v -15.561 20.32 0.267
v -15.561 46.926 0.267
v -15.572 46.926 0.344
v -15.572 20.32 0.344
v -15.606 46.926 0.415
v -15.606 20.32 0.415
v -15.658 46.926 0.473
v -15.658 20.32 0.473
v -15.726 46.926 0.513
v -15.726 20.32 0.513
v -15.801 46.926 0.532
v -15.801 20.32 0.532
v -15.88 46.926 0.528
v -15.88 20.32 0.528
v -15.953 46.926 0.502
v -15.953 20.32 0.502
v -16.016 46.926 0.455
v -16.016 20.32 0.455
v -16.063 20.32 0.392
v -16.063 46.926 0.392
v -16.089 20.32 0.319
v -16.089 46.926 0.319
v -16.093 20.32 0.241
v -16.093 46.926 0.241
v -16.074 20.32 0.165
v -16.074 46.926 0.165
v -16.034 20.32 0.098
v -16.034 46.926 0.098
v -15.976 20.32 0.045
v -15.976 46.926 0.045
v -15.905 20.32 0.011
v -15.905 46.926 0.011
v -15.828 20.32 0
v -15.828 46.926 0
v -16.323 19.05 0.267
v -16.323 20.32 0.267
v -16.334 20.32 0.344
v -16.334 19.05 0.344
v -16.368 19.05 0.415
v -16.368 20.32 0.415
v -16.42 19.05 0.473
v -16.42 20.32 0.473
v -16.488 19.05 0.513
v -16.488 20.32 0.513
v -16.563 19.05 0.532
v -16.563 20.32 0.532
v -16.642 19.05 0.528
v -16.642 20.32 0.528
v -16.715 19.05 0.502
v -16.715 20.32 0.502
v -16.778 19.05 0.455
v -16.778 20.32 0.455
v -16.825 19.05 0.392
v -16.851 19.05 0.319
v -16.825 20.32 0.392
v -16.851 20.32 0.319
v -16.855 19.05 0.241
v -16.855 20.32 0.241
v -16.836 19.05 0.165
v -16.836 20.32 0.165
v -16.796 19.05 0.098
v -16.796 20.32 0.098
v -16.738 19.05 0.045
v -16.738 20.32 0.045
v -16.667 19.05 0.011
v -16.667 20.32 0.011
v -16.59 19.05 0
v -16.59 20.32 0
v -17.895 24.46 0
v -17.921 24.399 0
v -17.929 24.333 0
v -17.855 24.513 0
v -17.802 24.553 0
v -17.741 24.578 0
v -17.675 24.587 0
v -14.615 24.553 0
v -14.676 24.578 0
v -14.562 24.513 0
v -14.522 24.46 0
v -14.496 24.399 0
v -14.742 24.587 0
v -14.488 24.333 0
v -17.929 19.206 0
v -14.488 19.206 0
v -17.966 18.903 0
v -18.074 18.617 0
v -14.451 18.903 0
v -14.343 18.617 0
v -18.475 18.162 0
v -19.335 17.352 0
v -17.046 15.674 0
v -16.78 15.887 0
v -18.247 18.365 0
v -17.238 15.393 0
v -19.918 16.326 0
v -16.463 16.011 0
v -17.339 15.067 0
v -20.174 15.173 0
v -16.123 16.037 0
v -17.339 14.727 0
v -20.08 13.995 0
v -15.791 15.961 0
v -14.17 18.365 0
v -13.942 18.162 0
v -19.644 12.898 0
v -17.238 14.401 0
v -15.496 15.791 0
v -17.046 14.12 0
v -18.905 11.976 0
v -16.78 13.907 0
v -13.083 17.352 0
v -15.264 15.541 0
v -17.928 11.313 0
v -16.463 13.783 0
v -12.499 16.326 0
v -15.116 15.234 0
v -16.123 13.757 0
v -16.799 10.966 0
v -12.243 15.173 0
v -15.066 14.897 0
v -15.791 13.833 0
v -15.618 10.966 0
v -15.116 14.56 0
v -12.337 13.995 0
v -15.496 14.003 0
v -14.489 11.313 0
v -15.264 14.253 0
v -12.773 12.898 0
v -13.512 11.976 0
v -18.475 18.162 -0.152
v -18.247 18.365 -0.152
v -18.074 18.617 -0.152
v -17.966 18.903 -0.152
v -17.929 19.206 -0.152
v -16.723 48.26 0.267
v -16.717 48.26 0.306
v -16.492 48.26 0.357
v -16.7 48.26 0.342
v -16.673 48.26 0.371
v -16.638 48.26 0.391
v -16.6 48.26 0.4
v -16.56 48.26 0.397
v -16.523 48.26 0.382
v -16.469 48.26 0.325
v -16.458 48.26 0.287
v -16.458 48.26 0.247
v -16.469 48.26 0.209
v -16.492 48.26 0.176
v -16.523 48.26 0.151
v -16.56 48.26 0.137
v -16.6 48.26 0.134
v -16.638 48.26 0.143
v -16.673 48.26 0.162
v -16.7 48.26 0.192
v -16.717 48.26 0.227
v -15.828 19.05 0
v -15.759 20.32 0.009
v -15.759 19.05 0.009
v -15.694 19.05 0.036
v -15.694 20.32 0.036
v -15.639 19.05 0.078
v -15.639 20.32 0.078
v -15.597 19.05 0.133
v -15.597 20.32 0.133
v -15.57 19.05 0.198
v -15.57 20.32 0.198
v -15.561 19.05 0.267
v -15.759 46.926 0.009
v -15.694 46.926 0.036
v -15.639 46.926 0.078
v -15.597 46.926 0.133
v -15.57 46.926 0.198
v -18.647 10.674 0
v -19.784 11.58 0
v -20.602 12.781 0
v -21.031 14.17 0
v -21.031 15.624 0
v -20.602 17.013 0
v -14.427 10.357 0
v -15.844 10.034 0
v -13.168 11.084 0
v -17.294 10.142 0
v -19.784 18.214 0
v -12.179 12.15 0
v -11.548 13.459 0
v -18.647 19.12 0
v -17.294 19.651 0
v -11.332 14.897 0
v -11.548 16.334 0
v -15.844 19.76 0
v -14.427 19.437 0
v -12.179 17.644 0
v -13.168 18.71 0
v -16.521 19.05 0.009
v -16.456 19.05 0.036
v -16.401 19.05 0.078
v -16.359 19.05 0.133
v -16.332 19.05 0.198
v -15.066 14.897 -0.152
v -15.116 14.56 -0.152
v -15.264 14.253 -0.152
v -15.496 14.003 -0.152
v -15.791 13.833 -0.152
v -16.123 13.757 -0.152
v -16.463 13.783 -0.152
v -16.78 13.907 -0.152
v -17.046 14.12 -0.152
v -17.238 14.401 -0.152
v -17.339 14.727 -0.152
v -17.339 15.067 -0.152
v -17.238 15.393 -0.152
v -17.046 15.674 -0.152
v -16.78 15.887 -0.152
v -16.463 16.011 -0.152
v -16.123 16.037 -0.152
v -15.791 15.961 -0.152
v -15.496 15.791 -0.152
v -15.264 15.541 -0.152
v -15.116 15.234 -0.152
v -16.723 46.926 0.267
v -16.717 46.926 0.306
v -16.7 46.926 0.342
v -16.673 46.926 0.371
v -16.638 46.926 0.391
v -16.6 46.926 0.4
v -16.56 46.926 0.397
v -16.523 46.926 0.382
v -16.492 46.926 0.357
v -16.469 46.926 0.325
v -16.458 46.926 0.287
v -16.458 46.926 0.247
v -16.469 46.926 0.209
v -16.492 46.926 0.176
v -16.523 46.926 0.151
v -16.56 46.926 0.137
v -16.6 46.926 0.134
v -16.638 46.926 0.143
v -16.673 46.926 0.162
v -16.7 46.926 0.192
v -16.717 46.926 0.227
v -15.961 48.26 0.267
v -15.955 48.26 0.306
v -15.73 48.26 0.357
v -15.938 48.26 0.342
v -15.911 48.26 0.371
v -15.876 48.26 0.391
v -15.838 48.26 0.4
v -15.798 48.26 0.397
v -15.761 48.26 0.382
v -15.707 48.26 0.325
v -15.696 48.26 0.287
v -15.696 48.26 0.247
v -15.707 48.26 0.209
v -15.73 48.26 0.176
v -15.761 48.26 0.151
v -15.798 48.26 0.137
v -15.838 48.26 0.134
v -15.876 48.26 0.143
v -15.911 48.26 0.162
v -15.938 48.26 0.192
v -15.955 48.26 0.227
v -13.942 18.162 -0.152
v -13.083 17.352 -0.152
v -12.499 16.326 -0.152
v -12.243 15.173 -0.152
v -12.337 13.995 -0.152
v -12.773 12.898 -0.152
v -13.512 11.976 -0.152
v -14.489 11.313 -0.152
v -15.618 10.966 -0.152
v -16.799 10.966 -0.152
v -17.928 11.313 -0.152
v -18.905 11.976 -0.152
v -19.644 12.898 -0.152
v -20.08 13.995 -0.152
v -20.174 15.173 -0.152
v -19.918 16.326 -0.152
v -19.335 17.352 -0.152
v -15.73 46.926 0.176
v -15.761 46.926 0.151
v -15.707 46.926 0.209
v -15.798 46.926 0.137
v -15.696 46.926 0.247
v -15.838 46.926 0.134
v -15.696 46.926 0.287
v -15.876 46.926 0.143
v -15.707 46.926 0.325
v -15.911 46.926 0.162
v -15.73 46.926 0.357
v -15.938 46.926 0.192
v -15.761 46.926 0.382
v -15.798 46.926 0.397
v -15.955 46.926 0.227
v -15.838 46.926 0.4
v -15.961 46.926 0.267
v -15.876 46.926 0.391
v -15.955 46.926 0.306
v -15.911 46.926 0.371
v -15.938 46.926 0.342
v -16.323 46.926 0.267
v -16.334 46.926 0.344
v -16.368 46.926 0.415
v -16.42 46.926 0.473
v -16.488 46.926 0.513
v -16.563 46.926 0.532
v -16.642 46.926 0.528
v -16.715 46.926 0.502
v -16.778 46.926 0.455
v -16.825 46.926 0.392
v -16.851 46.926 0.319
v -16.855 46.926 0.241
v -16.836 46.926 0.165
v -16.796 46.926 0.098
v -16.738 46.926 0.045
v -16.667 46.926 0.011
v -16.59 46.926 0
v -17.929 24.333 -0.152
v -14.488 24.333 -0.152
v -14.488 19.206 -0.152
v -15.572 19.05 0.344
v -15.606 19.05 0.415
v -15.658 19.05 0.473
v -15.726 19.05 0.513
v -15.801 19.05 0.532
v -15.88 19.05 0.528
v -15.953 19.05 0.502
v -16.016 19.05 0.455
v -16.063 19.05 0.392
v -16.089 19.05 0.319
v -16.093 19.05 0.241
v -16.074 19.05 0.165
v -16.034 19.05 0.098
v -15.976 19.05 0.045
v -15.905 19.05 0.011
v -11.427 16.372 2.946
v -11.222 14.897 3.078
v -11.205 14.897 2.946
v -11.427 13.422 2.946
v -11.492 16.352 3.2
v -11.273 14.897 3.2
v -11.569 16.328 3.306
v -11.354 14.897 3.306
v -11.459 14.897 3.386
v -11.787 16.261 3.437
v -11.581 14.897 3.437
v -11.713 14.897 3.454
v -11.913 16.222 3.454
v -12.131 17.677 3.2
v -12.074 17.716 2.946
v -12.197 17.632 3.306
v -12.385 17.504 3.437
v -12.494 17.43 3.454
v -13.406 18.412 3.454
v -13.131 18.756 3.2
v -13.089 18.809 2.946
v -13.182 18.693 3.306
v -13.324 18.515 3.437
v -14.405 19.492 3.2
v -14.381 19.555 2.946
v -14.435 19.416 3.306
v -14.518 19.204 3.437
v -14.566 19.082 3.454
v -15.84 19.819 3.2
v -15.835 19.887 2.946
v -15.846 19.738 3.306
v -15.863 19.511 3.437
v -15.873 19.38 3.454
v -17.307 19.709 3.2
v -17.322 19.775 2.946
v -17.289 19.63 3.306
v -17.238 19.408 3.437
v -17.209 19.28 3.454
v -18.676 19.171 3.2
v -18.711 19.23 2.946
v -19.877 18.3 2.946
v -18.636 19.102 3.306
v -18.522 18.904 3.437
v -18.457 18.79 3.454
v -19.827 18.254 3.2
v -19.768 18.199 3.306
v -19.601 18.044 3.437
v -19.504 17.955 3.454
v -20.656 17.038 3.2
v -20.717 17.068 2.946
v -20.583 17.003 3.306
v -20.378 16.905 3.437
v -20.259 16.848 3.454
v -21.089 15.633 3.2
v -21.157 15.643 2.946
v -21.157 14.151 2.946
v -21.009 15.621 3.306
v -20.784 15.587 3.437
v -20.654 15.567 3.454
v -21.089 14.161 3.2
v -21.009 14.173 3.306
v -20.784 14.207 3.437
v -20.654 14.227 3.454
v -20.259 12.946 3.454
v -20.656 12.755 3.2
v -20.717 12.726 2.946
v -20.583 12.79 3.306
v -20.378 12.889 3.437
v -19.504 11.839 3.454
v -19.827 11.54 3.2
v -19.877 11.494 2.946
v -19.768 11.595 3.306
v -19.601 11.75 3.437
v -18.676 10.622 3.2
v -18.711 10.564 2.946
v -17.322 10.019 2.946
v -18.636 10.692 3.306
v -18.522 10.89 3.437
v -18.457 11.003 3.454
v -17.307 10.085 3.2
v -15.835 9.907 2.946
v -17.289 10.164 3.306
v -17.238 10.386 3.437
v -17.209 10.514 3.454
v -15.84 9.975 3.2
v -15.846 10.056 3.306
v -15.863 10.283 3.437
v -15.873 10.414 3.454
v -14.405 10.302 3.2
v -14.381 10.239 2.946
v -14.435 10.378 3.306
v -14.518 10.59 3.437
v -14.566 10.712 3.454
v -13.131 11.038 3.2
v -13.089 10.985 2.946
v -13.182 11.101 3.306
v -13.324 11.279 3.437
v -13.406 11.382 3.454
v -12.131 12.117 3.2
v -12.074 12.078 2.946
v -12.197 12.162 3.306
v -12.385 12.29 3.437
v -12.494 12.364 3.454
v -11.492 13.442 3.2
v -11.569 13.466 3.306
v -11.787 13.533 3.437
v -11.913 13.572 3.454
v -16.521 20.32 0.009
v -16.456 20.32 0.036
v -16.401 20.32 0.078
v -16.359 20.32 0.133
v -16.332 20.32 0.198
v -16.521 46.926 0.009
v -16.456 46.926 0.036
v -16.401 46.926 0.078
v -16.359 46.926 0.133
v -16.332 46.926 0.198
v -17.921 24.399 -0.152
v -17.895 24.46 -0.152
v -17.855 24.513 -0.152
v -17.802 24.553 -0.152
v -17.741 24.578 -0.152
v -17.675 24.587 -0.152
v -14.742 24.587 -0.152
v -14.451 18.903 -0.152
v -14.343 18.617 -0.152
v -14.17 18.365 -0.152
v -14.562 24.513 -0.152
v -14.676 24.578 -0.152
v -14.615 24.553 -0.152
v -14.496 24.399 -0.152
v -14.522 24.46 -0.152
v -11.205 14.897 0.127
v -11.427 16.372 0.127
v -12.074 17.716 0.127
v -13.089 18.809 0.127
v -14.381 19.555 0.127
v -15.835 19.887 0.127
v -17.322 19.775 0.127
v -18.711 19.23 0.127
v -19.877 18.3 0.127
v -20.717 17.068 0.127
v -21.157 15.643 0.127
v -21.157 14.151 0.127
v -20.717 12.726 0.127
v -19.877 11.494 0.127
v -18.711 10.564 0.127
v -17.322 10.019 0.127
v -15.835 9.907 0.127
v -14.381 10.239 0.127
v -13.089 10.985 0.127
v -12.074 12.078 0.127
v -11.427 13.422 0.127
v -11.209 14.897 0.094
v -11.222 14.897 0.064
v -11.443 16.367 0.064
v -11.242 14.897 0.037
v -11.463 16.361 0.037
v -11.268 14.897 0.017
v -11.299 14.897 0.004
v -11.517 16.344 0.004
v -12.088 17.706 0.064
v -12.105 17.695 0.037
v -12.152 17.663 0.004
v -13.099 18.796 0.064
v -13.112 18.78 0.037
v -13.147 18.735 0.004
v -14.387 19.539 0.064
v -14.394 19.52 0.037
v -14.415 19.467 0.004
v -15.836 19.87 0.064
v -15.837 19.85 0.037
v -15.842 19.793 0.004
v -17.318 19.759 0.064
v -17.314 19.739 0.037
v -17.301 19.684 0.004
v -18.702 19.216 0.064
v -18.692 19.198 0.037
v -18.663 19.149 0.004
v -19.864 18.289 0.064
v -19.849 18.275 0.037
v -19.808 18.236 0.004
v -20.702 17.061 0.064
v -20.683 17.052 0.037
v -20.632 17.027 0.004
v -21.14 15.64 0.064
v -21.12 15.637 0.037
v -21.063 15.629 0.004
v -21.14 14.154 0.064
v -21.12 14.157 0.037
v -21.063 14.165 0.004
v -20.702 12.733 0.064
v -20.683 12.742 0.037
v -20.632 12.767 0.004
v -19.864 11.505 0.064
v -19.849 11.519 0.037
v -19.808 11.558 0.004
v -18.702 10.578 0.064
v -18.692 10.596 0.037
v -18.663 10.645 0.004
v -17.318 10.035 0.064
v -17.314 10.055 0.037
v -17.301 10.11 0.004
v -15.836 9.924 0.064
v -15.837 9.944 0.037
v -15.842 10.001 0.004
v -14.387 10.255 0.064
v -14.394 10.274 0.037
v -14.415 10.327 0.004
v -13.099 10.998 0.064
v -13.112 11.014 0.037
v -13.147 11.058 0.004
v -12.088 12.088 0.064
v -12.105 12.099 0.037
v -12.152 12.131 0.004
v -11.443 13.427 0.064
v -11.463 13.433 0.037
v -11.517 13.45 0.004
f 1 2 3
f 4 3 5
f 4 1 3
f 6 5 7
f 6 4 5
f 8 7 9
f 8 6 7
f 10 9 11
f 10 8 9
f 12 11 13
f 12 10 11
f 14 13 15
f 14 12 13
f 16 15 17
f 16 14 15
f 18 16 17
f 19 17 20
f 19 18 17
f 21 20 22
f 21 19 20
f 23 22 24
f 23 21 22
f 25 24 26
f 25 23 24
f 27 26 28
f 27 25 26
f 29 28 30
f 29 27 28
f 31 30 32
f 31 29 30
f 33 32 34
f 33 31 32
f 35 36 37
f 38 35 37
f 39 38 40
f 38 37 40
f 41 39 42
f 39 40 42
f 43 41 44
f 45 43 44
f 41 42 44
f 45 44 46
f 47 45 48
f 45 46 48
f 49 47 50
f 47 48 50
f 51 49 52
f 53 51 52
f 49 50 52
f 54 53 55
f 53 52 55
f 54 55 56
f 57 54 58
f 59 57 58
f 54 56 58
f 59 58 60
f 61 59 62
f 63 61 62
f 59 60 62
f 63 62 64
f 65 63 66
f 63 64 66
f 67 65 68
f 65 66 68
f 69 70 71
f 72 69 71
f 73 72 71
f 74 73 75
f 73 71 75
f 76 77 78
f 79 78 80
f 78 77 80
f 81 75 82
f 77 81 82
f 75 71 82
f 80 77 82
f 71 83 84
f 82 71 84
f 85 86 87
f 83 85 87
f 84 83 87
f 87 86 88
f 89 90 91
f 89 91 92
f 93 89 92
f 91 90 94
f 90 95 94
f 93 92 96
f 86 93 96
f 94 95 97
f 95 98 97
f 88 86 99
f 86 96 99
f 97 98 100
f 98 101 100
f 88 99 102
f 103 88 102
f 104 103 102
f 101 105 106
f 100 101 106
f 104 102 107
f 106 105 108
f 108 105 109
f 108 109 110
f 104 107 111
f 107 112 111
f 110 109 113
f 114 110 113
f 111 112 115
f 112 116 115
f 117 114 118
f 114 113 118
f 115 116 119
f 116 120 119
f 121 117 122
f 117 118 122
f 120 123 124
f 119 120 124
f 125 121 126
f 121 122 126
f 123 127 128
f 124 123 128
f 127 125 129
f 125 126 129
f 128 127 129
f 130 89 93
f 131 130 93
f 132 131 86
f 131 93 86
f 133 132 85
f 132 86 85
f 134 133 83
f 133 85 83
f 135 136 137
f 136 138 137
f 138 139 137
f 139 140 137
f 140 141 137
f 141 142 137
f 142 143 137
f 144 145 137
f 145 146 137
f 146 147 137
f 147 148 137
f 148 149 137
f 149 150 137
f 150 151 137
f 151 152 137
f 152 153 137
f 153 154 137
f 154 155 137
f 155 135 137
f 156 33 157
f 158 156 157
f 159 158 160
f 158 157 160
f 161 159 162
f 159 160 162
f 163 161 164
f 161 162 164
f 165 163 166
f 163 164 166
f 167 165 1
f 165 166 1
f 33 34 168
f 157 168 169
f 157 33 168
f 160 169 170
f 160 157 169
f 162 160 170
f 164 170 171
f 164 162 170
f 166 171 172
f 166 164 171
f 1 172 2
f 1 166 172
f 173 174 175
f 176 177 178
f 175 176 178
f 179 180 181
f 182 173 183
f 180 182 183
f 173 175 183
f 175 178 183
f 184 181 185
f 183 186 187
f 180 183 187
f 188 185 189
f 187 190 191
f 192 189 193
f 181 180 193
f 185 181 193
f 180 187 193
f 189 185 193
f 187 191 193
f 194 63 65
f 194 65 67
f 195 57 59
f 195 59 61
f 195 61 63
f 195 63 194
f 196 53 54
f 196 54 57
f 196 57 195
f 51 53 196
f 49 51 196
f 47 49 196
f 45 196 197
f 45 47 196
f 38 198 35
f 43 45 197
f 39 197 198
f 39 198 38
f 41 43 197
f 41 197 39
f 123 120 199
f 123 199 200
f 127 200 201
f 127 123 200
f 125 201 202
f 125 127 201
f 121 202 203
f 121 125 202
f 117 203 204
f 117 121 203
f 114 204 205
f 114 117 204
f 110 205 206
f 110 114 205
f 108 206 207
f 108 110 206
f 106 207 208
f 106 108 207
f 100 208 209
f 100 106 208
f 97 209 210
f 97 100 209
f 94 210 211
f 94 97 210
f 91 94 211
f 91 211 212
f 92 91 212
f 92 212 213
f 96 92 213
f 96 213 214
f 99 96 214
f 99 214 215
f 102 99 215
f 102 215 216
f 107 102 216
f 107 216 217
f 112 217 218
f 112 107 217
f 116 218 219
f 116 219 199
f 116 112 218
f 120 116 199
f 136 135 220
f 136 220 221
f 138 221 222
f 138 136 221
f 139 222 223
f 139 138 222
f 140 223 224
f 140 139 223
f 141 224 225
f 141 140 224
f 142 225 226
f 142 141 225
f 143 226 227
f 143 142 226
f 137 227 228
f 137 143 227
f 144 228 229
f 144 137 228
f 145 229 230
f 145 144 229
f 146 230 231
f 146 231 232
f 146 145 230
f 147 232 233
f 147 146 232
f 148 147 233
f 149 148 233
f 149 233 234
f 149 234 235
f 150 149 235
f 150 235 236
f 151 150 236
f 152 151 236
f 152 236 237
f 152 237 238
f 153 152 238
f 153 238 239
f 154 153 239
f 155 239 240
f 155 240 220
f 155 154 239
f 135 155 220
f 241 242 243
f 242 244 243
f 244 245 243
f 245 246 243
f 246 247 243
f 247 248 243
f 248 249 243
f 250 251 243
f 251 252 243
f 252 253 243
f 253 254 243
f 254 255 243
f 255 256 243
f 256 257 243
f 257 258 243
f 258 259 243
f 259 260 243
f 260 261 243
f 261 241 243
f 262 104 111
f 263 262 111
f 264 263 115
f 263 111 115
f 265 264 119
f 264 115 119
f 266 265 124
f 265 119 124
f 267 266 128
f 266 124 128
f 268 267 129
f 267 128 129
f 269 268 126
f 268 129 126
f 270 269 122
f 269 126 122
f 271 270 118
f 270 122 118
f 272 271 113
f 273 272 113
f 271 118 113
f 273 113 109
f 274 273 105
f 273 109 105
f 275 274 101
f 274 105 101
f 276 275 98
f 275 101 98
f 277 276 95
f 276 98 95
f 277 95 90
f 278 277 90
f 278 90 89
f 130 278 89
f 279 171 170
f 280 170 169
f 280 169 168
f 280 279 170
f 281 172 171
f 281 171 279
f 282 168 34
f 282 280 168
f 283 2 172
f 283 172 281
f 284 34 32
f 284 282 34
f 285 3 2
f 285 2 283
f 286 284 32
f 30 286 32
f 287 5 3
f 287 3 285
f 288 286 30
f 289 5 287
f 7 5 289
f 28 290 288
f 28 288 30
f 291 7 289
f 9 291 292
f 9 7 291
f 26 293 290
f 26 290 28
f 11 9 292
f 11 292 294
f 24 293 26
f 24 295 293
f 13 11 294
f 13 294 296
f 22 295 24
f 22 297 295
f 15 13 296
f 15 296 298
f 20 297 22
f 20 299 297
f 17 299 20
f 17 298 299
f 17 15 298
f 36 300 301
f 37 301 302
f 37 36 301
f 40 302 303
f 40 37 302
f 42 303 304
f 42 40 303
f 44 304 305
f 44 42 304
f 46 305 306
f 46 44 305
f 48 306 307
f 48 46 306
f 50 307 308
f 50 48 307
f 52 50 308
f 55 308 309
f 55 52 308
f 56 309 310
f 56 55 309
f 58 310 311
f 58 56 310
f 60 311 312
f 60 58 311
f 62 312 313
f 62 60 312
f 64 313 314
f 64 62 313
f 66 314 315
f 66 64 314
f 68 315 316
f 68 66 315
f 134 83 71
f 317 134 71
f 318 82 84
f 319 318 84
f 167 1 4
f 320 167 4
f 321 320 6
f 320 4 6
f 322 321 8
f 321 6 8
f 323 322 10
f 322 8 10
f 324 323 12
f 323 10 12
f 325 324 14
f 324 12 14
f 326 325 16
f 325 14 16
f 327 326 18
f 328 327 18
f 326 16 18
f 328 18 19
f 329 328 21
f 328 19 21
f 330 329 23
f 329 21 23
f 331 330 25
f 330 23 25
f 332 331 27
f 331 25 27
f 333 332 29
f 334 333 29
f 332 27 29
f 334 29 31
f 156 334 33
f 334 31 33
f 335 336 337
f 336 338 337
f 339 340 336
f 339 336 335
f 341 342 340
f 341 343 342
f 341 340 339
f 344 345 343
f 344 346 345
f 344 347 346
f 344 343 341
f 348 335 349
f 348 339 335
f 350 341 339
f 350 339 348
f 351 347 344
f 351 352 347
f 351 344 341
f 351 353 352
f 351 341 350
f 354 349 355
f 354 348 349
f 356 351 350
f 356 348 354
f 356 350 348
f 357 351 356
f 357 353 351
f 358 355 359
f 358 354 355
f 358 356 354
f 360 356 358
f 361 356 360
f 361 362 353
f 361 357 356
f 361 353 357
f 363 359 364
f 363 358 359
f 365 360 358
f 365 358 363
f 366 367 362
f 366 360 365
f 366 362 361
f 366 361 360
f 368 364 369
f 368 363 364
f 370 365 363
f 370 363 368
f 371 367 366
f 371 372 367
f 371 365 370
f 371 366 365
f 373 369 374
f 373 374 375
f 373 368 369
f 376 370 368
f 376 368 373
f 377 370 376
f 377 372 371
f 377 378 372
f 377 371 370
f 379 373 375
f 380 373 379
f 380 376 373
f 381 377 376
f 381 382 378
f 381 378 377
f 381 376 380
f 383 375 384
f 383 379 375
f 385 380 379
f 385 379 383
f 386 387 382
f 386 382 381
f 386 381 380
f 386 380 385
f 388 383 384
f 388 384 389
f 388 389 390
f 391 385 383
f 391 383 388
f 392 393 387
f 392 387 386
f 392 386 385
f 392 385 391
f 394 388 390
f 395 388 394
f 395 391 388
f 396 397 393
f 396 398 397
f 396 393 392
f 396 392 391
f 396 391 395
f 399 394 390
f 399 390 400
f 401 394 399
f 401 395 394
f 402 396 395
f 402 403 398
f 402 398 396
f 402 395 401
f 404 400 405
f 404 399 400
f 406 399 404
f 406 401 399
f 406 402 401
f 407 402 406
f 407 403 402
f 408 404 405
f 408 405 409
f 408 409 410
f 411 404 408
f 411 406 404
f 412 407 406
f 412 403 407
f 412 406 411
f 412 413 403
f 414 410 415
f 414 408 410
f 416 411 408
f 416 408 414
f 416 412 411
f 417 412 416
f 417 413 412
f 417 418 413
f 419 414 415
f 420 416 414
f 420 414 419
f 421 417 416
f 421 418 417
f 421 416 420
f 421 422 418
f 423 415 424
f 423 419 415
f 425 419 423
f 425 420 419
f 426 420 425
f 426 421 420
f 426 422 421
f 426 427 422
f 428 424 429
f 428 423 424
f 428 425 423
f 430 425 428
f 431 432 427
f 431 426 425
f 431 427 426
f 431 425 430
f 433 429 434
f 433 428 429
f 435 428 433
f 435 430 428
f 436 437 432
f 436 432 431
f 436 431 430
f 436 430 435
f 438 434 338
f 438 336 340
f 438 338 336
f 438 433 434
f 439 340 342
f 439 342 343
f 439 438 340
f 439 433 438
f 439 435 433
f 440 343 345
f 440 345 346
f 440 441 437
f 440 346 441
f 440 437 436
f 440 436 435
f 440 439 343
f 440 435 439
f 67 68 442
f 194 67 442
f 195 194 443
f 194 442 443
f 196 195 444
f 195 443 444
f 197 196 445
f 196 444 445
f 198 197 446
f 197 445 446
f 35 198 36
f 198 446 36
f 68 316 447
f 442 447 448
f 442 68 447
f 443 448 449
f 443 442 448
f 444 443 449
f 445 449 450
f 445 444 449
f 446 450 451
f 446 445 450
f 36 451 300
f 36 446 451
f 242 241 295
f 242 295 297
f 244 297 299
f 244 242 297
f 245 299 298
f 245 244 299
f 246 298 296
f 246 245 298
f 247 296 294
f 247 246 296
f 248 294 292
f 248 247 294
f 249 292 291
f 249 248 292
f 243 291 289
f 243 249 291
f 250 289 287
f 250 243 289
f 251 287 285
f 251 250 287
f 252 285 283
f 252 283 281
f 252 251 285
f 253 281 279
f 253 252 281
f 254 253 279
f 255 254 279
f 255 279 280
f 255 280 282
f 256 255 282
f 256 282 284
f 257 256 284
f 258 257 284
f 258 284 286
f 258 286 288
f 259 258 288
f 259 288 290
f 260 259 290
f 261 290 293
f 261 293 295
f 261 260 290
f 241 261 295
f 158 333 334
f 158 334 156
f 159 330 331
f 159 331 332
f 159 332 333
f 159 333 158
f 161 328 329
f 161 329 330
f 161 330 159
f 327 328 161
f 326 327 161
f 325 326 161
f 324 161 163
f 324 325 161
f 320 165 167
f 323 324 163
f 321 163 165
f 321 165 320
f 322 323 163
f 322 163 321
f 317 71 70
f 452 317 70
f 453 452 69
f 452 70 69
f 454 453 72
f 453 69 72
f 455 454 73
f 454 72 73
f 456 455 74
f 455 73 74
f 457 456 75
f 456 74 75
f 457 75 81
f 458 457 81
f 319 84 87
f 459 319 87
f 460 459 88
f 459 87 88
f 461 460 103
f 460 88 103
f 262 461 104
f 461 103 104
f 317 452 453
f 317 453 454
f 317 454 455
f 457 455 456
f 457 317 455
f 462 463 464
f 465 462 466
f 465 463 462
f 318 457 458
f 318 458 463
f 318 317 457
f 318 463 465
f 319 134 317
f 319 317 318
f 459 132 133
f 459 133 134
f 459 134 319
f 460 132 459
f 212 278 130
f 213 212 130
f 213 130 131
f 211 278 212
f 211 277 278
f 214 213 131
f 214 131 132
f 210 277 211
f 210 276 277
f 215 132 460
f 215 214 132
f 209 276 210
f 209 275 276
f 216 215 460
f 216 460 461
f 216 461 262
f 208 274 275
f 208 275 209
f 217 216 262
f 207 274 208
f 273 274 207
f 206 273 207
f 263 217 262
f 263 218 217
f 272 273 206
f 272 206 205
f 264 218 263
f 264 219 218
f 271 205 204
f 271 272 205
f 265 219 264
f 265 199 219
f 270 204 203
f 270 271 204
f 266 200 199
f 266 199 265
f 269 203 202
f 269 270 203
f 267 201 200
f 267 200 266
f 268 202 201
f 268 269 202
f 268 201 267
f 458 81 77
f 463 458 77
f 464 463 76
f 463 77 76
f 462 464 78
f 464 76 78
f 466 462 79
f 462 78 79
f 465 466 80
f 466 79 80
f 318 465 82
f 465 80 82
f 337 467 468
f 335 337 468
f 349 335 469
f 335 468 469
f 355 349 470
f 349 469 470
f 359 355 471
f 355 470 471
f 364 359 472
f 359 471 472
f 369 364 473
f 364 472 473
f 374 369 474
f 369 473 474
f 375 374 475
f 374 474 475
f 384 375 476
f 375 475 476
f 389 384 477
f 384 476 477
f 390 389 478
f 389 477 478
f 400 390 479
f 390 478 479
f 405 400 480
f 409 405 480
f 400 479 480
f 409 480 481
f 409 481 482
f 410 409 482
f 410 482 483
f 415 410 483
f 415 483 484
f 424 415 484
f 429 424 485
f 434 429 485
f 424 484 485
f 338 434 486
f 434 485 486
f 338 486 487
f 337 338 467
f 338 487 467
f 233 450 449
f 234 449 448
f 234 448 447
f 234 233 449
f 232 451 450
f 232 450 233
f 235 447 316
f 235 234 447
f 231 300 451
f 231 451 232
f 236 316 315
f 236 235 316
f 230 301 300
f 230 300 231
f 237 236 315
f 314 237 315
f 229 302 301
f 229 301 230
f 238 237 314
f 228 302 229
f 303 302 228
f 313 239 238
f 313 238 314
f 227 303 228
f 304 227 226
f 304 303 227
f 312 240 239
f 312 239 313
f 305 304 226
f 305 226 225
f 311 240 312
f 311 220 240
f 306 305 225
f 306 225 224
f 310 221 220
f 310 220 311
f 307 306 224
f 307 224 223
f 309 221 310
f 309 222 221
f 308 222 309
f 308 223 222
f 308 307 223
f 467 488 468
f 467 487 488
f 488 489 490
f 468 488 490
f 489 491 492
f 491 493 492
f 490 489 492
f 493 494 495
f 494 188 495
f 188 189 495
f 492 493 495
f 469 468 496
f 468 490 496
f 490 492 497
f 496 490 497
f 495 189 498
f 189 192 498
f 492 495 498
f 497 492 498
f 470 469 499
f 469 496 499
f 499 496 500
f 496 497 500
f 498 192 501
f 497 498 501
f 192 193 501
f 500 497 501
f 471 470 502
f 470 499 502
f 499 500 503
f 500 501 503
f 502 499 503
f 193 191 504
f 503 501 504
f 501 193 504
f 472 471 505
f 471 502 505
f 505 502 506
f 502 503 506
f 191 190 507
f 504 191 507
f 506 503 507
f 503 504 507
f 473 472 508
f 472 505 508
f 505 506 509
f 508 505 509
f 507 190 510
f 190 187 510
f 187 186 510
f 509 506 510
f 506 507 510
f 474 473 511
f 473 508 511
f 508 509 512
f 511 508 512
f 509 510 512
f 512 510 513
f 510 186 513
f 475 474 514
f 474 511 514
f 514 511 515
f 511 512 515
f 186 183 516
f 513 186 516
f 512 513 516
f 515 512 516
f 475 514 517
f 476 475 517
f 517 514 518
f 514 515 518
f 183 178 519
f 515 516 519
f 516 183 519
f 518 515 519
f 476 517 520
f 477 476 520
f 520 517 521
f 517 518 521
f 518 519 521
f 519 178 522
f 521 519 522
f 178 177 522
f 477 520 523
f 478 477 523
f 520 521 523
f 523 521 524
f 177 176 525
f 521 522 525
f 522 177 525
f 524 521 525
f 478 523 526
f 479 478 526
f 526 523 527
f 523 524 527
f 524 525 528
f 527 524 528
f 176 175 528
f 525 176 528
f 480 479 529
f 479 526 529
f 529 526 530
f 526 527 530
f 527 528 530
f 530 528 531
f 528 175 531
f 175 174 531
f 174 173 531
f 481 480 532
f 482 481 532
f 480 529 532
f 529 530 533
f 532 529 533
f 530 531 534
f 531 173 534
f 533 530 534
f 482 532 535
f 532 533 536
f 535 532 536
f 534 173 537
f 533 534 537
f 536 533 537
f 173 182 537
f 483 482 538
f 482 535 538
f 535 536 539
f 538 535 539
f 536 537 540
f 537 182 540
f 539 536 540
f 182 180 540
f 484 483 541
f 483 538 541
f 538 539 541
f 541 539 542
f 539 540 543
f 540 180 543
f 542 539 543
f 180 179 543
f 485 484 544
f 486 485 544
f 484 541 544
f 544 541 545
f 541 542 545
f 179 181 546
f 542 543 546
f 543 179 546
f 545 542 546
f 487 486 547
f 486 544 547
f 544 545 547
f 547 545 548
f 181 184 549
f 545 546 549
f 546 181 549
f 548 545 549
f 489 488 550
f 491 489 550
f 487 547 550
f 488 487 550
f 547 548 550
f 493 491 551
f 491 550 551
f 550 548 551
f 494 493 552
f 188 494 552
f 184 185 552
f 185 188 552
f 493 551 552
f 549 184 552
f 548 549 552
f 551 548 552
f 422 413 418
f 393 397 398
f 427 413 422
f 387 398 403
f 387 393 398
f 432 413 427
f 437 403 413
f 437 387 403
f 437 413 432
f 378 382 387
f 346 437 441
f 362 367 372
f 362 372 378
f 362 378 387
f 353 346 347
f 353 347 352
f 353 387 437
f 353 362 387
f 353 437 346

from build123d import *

# Parameters (mm, degrees)
F0_R      = 5.0038
F1_DEPTH  = 3.4544
F2_R      = 1.143
F3_DEPTH  = 0.1524
F6_DEPTH  = 1.27
F7_DEPTH  = 1.27
F8_DEPTH  = 27.94
F9_DEPTH  = 27.94
F10_R     = 0.2667
F10_R_2   = 0.13335
F11_DEPTH = 1.3335
F12_DEPTH = 1.3335
F13_R     = 0.508
F14_R     = 0.127


with BuildPart() as f1:
    # F0 (on Top) → F1 (new body)
    with BuildSketch(Plane.XY):
        with Locations((-16.2086095661, 14.8969562724)):
            Circle(F0_R)
    extrude(amount=F1_DEPTH)

    # F13
    f13_edges = [f1.edges().sort_by_distance(p)[0] for p in [
        (-21.21241, 14.896956, 3.4544),
    ]]
    fillet(f13_edges, radius=F13_R)

    # F14
    f14_edges = [f1.edges().sort_by_distance(p)[0] for p in [
        (-21.21241, 14.896956, 0),
    ]]
    fillet(f14_edges, radius=F14_R)


with BuildPart() as f3:
    # F2 (on face) → F3 (new body)
    with BuildSketch(Plane(origin=(0, 0, 0), x_dir=(1, 0, 0), z_dir=(0, 0, -1))):
        with BuildLine():
            Line((-17.9294595661, -19.2057716882), (-17.9294595661, -19.5955400716))
            ThreePointArc((-17.9294595661, -19.5955400716), (-16.2086095661, -19.9007562724), (-14.4877595661, -19.5955400716))
            Line((-14.4877595661, -19.5955400716), (-14.4877595661, -19.2057716882))
            ThreePointArc((-14.4877595661, -19.2057716882), (-14.3430605213, -18.6170461492), (-13.9419363215, -18.1624749774))
            ThreePointArc((-13.9419363215, -18.1624749774), (-16.2086095661, -10.9218562724), (-18.4752828106, -18.1624749774))
            ThreePointArc((-18.4752828106, -18.1624749774), (-18.0741586109, -18.6170461492), (-17.9294595661, -19.2057716882))
        make_face()
        with Locations((-16.2086095661, -14.8969562724)):
            Circle(F2_R, mode=Mode.SUBTRACT)
        with BuildLine():
            ThreePointArc((-14.4877595661, -19.5955400716), (-16.2086095661, -19.9007562724), (-17.9294595661, -19.5955400716))
            Line((-17.9294595661, -19.5955400716), (-17.9294595661, -24.3330562724))
            ThreePointArc((-17.9294595661, -24.3330562724), (-17.8550646885, -24.5126613948), (-17.6754595661, -24.5870562724))
            Line((-17.6754595661, -24.5870562724), (-14.7417595661, -24.5870562724))
            ThreePointArc((-14.7417595661, -24.5870562724), (-14.5621544437, -24.5126613948), (-14.4877595661, -24.3330562724))
            Line((-14.4877595661, -24.3330562724), (-14.4877595661, -19.5955400716))
        make_face()
    extrude(amount=F3_DEPTH)


with BuildPart() as f6:
    # F5 (on offset) → F6 (new body)
    with BuildSketch(Plane.XZ.offset(-20.32)):
        with BuildLine():
            ThreePointArc((-16.5896095661, 0), (-16.4010241876, 0.0781146215), (-16.3229095661, 0.2667))
            ThreePointArc((-16.3229095661, 0.2667), (-16.7781949446, 0.4552853785), (-16.5896095661, 0))
        make_face()
    extrude(amount=F6_DEPTH)

    # F5 (on offset) → F8 (join)
    with BuildSketch(Plane.XZ.offset(-20.32)):
        with BuildLine():
            ThreePointArc((-16.5896095661, 0), (-16.4010241876, 0.0781146215), (-16.3229095661, 0.2667))
            ThreePointArc((-16.3229095661, 0.2667), (-16.7781949446, 0.4552853785), (-16.5896095661, 0))
        make_face()
    extrude(amount=-F8_DEPTH)

    # F10 (on face) → F12 (cut)
    with BuildSketch(Plane(origin=(0, 48.26, 0), x_dir=(-1, 0, 0), z_dir=(0, 1, 0))):
        with Locations((16.5896095661, 0.2667)):
            Circle(F10_R)
        with Locations((16.5896095661, 0.2667)):
            Circle(F10_R_2, mode=Mode.SUBTRACT)
    extrude(amount=-F12_DEPTH, mode=Mode.SUBTRACT)


with BuildPart() as f7:
    # F5 (on offset) → F7 (new body)
    with BuildSketch(Plane.XZ.offset(-20.32)):
        with BuildLine():
            ThreePointArc((-15.5609095661, 0.2667), (-16.0161949446, 0.4552853785), (-15.8276095661, 0))
            ThreePointArc((-15.8276095661, 0), (-15.6390241876, 0.0781146215), (-15.5609095661, 0.2667))
        make_face()
    extrude(amount=F7_DEPTH)

    # F5 (on offset) → F9 (join)
    with BuildSketch(Plane.XZ.offset(-20.32)):
        with BuildLine():
            ThreePointArc((-15.5609095661, 0.2667), (-16.0161949446, 0.4552853785), (-15.8276095661, 0))
            ThreePointArc((-15.8276095661, 0), (-15.6390241876, 0.0781146215), (-15.5609095661, 0.2667))
        make_face()
    extrude(amount=-F9_DEPTH)

    # F10 (on face) → F11 (cut)
    with BuildSketch(Plane(origin=(0, 48.26, 0), x_dir=(-1, 0, 0), z_dir=(0, 1, 0))):
        with Locations((15.8276095661, 0.2667)):
            Circle(F10_R)
        with Locations((15.8276095661, 0.2667)):
            Circle(F10_R_2, mode=Mode.SUBTRACT)
    extrude(amount=-F11_DEPTH, mode=Mode.SUBTRACT)


solid = Compound([f1.part, f3.part, f6.part, f7.part])
